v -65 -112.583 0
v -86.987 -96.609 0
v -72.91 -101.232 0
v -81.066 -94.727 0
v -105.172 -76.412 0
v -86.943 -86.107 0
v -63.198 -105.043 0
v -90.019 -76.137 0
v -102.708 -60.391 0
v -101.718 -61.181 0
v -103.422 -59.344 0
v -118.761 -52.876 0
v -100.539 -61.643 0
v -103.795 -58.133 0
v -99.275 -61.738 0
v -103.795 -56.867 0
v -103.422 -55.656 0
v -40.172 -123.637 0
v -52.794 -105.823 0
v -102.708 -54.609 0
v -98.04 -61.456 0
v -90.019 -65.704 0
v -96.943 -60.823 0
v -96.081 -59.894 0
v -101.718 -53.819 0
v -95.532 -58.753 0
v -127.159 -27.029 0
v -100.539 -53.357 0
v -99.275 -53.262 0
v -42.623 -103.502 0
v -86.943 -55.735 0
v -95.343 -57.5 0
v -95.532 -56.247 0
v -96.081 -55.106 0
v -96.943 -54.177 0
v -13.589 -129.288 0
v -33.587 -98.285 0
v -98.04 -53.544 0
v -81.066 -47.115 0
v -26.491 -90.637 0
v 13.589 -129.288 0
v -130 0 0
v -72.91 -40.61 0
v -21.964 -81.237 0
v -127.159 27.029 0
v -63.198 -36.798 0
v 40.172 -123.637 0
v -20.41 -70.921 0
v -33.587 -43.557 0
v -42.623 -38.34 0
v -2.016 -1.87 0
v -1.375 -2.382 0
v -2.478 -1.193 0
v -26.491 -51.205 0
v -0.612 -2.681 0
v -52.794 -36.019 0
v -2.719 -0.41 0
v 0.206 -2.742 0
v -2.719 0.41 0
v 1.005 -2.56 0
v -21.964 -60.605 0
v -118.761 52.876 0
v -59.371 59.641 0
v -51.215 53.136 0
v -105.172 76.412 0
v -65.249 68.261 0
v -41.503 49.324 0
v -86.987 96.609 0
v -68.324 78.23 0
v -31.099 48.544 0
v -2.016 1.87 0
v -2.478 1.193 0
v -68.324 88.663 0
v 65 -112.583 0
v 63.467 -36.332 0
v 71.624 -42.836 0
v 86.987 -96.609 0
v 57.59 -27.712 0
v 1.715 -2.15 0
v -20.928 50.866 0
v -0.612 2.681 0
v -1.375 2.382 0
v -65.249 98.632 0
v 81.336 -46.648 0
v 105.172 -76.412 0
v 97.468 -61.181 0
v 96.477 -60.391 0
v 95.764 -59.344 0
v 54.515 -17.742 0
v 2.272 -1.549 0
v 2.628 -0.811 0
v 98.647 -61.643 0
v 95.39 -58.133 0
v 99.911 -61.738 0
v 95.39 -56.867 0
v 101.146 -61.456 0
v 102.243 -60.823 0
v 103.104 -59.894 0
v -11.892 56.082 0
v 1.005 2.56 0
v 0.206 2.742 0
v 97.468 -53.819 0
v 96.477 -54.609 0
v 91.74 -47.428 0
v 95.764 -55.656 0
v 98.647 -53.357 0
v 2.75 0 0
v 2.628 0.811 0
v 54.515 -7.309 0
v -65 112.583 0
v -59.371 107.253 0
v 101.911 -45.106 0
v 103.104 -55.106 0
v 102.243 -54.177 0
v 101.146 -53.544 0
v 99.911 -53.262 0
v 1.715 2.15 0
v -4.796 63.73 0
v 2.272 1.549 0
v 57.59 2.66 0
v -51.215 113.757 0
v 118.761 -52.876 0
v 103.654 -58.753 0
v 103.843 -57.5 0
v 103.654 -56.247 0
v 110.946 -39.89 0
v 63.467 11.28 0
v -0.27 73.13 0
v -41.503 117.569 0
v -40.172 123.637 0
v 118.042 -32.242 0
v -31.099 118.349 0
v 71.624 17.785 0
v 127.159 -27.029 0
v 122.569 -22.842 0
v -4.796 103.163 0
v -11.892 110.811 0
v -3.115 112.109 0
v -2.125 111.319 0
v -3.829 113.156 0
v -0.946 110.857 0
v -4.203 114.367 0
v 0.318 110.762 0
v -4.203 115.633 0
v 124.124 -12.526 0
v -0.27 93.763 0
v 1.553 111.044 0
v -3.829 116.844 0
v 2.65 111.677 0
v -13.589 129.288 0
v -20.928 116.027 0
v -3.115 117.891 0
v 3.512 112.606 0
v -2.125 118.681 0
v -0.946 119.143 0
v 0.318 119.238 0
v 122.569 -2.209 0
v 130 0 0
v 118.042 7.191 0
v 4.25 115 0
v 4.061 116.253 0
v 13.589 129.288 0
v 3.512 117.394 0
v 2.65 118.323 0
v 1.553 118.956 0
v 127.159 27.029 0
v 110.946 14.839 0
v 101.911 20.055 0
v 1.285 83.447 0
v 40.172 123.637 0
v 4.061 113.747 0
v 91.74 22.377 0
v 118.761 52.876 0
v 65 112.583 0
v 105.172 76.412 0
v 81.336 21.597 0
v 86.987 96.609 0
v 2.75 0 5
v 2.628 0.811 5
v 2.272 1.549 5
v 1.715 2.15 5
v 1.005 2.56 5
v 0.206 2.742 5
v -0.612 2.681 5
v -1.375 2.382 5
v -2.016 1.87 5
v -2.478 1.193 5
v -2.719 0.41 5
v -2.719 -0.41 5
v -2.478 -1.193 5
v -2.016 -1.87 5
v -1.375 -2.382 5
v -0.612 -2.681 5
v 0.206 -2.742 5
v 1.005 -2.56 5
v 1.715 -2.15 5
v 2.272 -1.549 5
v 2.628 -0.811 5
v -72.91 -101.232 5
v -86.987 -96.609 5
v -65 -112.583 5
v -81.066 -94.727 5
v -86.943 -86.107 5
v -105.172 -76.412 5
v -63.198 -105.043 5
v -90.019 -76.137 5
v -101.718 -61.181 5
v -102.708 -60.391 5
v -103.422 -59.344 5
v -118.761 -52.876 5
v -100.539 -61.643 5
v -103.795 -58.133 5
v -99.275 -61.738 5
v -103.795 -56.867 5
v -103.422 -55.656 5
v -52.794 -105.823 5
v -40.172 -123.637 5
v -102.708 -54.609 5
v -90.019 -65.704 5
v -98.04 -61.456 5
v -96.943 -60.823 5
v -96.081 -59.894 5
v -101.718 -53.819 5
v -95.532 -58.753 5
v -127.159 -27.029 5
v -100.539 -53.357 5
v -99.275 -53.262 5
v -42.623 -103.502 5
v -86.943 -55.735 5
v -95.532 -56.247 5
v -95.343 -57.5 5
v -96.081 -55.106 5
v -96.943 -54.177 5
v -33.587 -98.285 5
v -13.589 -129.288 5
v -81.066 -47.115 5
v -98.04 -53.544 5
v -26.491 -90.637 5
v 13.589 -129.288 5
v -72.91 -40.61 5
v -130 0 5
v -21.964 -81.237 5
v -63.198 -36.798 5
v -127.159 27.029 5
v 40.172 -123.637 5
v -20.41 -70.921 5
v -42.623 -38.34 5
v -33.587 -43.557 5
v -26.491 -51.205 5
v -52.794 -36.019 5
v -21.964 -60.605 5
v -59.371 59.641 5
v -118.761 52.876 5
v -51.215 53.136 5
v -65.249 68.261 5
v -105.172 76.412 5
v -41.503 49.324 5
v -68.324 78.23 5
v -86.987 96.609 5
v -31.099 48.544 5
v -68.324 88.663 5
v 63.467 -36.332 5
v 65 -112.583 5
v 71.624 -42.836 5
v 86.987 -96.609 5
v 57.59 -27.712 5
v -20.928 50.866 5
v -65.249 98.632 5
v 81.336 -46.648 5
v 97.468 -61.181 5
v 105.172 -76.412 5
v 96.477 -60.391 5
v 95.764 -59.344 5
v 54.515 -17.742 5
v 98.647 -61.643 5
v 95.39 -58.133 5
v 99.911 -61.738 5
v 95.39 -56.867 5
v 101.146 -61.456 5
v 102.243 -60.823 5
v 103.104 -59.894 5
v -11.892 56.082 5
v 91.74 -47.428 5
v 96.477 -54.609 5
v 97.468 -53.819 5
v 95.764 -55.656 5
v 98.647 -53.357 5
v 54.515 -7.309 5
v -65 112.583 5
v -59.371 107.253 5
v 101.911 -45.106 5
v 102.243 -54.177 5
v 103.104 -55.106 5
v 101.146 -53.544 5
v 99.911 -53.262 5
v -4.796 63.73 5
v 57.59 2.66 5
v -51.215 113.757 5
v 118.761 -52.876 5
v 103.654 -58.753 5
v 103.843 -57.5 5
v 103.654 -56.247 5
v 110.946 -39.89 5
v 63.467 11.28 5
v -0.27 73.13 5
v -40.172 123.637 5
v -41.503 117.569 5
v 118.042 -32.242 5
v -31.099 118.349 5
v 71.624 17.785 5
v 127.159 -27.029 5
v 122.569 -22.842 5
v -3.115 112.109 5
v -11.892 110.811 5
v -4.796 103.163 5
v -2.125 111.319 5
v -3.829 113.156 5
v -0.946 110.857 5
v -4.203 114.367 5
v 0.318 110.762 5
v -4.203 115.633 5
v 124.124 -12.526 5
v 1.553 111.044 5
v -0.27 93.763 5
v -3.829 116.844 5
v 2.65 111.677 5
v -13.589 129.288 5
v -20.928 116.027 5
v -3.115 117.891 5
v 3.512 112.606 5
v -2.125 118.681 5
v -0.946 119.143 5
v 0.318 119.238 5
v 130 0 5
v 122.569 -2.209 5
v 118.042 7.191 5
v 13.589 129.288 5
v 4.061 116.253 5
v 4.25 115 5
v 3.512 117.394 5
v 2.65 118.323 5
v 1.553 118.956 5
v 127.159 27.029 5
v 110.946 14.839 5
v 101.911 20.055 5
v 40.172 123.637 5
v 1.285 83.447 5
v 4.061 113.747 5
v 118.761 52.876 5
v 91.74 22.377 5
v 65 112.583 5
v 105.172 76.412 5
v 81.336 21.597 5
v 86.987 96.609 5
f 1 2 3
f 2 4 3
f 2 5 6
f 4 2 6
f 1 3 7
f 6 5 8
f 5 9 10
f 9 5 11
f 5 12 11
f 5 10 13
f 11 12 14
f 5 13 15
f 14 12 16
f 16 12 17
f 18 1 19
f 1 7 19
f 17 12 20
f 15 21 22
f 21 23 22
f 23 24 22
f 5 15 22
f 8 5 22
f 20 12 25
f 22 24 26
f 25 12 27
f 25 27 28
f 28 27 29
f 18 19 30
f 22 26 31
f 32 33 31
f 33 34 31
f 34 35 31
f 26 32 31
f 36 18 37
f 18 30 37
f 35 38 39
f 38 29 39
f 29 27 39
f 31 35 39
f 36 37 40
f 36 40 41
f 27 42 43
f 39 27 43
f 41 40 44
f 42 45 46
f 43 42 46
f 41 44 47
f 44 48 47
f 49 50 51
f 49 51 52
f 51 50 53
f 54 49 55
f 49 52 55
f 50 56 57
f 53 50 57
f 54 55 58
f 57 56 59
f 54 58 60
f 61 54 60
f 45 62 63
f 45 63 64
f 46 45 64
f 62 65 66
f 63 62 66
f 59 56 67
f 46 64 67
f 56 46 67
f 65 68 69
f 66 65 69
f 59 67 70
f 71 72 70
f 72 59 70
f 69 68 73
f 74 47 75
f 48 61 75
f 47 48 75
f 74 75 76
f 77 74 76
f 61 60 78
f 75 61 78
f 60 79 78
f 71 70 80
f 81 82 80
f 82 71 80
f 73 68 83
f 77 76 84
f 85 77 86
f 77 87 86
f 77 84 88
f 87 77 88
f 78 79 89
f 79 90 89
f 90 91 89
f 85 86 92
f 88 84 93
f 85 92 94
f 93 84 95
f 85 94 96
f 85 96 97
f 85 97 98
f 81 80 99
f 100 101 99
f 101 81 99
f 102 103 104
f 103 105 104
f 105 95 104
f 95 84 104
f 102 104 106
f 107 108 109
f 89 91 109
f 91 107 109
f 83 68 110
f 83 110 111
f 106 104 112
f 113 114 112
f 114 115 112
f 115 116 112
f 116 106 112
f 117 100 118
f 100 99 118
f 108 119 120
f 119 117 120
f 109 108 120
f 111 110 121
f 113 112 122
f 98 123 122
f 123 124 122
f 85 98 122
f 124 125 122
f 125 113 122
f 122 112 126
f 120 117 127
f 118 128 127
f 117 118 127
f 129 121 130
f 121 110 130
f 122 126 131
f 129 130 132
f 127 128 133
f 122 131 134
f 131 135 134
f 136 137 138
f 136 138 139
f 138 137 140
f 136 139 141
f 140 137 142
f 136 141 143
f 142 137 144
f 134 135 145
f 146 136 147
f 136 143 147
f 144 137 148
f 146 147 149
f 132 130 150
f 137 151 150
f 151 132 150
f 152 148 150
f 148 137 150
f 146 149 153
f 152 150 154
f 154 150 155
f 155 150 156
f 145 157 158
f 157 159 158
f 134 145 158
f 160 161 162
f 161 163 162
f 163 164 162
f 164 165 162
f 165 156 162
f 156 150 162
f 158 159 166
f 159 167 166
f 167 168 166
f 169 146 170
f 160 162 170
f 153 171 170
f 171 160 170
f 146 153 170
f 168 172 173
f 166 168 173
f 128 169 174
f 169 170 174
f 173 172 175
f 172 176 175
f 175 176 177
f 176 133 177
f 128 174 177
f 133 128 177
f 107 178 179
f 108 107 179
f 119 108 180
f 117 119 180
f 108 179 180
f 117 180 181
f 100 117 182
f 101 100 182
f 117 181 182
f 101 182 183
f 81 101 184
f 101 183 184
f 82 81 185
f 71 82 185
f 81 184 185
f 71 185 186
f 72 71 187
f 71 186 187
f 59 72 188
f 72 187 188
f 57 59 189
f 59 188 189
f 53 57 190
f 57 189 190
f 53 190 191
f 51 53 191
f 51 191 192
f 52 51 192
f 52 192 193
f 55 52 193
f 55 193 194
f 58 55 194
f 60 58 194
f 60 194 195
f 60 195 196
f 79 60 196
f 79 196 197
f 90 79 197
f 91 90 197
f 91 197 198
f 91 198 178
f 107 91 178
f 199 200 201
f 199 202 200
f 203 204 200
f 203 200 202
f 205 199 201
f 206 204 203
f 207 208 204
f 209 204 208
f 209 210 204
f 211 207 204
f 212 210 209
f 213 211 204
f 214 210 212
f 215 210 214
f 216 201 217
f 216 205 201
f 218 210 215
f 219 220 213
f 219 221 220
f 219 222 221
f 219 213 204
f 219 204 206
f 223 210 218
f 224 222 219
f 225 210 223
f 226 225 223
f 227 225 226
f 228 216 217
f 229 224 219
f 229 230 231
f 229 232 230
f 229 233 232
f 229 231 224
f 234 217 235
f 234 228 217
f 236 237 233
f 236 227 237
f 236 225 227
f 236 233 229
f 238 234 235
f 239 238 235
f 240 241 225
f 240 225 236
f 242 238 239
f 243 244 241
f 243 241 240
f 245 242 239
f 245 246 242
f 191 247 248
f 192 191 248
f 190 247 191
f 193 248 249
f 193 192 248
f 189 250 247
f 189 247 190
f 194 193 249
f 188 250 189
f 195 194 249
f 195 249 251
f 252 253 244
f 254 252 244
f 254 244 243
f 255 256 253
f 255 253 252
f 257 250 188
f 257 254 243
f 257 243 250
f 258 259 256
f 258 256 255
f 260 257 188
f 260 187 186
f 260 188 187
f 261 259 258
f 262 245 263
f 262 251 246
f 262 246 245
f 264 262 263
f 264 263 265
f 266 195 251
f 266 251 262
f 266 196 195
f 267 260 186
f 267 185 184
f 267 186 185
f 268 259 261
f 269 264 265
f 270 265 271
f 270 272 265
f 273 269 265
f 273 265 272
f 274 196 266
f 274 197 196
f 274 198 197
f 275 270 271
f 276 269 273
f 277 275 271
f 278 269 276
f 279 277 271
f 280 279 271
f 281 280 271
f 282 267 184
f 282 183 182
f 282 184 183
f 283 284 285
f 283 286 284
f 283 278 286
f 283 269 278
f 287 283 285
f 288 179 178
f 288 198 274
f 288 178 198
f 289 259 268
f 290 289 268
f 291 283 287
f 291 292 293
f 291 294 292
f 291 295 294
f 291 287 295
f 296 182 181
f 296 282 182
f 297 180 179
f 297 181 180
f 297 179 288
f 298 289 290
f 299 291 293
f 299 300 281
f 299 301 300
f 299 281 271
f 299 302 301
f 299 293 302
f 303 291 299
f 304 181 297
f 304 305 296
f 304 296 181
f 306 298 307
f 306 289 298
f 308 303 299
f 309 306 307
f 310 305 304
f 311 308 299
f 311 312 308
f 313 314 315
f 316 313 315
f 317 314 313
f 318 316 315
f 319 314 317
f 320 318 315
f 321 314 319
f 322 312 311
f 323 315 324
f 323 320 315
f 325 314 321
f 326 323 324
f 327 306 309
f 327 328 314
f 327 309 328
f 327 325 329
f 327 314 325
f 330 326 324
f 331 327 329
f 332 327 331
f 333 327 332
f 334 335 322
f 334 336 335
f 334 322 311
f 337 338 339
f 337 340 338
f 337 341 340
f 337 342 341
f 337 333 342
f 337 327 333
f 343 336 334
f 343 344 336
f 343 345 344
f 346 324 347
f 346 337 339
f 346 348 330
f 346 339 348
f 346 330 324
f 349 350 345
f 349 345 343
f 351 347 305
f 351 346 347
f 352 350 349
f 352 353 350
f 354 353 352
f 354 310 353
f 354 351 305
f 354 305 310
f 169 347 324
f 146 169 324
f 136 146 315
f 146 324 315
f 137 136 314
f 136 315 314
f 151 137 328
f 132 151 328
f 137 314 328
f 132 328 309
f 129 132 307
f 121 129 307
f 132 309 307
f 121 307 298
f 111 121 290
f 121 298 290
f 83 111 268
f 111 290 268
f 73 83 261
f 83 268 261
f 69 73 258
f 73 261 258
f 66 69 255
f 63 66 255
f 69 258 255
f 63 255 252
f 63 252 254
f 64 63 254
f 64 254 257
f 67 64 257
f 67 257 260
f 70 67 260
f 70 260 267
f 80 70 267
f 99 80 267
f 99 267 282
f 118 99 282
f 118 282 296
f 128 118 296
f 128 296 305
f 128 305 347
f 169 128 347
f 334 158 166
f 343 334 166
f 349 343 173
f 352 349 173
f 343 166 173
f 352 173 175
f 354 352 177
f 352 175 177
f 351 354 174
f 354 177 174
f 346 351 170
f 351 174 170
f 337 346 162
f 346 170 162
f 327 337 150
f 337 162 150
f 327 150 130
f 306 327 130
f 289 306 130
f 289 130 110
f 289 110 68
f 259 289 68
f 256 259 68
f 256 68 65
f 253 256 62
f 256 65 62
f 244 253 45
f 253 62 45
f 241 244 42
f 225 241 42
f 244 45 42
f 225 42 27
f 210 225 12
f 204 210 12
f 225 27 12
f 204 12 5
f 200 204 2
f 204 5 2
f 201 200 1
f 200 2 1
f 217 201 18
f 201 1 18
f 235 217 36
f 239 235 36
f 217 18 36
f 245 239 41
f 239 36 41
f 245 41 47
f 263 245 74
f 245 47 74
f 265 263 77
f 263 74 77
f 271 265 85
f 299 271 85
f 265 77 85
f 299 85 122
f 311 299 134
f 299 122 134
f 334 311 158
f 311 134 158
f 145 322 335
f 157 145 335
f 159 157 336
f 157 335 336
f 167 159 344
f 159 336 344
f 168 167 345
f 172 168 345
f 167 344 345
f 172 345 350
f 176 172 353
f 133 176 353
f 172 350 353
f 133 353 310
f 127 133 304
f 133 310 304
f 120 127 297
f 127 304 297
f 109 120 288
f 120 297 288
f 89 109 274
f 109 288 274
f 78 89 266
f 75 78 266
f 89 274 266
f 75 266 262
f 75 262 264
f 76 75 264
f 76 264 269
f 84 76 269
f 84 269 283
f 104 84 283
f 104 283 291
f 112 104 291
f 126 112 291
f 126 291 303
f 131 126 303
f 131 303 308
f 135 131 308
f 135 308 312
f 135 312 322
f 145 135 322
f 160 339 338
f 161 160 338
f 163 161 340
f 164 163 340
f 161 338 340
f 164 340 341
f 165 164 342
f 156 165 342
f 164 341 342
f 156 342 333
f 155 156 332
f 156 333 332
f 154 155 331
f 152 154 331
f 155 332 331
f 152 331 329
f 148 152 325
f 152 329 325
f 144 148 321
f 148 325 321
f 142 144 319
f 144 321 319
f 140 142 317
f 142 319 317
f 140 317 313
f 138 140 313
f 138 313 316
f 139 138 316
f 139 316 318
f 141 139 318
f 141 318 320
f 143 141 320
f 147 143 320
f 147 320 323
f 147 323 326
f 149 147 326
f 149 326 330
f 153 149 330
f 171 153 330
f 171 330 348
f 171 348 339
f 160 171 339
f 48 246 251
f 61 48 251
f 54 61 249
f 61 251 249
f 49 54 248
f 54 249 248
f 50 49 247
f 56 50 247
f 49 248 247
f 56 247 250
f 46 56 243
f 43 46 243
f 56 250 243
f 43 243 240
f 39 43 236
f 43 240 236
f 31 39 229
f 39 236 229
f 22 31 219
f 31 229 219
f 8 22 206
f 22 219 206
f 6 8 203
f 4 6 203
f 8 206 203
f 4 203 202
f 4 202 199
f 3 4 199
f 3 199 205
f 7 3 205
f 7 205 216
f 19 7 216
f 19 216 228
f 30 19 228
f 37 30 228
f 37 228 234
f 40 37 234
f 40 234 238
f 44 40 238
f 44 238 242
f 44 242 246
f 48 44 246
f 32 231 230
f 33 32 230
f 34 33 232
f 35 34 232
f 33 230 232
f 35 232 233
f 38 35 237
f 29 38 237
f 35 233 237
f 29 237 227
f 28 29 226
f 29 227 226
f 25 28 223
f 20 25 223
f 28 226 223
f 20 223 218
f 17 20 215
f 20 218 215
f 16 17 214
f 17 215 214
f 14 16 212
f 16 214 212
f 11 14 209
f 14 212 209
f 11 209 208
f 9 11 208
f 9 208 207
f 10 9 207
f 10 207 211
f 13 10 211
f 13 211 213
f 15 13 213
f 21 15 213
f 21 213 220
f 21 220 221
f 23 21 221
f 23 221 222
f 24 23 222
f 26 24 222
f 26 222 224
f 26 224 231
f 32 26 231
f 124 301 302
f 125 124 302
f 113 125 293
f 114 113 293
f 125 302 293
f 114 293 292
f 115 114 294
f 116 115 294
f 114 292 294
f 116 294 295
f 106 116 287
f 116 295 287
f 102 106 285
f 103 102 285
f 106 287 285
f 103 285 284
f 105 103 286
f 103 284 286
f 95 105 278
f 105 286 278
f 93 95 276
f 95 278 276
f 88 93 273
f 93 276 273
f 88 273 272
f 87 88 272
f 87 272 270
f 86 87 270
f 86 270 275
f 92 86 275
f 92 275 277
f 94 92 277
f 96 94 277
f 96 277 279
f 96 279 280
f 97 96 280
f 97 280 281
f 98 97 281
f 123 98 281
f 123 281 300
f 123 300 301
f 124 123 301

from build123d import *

# Parameters (mm, degrees)
F0_R     = 130
F1_DEPTH = 5
F2_R     = 2.75
F2_R_2   = 4.25
F3_DEPTH = 5.001
F4_R     = 35
F5_DEPTH = 5.001


with BuildPart() as f1:
    # F0 (on Top) → F1 (new body)
    with BuildSketch(Plane.XY):
        Circle(F0_R)
    extrude(amount=F1_DEPTH)

    # F2 (on face) → F3 (cut, through all)
    with BuildSketch(Plane.XY.offset(5)):
        Circle(F2_R)
        with Locations((0, 115)):
            Circle(F2_R_2)
        with Locations((-99.592921, -57.5)):
            Circle(F2_R_2)
        with Locations((99.592921, -57.5)):
            Circle(F2_R_2)
    extrude(amount=-F3_DEPTH, mode=Mode.SUBTRACT)

    # F4 (on face) → F5 (cut, through all)
    with BuildSketch(Plane.XY.offset(5)):
        with Locations((-33.714593, 83.446547)):
            Circle(F4_R)
        with Locations((89.124126, -12.525579)):
            Circle(F4_R)
        with Locations((-55.409533, -70.920968)):
            Circle(F4_R)
    extrude(amount=-F5_DEPTH, mode=Mode.SUBTRACT)


solid = f1.part
